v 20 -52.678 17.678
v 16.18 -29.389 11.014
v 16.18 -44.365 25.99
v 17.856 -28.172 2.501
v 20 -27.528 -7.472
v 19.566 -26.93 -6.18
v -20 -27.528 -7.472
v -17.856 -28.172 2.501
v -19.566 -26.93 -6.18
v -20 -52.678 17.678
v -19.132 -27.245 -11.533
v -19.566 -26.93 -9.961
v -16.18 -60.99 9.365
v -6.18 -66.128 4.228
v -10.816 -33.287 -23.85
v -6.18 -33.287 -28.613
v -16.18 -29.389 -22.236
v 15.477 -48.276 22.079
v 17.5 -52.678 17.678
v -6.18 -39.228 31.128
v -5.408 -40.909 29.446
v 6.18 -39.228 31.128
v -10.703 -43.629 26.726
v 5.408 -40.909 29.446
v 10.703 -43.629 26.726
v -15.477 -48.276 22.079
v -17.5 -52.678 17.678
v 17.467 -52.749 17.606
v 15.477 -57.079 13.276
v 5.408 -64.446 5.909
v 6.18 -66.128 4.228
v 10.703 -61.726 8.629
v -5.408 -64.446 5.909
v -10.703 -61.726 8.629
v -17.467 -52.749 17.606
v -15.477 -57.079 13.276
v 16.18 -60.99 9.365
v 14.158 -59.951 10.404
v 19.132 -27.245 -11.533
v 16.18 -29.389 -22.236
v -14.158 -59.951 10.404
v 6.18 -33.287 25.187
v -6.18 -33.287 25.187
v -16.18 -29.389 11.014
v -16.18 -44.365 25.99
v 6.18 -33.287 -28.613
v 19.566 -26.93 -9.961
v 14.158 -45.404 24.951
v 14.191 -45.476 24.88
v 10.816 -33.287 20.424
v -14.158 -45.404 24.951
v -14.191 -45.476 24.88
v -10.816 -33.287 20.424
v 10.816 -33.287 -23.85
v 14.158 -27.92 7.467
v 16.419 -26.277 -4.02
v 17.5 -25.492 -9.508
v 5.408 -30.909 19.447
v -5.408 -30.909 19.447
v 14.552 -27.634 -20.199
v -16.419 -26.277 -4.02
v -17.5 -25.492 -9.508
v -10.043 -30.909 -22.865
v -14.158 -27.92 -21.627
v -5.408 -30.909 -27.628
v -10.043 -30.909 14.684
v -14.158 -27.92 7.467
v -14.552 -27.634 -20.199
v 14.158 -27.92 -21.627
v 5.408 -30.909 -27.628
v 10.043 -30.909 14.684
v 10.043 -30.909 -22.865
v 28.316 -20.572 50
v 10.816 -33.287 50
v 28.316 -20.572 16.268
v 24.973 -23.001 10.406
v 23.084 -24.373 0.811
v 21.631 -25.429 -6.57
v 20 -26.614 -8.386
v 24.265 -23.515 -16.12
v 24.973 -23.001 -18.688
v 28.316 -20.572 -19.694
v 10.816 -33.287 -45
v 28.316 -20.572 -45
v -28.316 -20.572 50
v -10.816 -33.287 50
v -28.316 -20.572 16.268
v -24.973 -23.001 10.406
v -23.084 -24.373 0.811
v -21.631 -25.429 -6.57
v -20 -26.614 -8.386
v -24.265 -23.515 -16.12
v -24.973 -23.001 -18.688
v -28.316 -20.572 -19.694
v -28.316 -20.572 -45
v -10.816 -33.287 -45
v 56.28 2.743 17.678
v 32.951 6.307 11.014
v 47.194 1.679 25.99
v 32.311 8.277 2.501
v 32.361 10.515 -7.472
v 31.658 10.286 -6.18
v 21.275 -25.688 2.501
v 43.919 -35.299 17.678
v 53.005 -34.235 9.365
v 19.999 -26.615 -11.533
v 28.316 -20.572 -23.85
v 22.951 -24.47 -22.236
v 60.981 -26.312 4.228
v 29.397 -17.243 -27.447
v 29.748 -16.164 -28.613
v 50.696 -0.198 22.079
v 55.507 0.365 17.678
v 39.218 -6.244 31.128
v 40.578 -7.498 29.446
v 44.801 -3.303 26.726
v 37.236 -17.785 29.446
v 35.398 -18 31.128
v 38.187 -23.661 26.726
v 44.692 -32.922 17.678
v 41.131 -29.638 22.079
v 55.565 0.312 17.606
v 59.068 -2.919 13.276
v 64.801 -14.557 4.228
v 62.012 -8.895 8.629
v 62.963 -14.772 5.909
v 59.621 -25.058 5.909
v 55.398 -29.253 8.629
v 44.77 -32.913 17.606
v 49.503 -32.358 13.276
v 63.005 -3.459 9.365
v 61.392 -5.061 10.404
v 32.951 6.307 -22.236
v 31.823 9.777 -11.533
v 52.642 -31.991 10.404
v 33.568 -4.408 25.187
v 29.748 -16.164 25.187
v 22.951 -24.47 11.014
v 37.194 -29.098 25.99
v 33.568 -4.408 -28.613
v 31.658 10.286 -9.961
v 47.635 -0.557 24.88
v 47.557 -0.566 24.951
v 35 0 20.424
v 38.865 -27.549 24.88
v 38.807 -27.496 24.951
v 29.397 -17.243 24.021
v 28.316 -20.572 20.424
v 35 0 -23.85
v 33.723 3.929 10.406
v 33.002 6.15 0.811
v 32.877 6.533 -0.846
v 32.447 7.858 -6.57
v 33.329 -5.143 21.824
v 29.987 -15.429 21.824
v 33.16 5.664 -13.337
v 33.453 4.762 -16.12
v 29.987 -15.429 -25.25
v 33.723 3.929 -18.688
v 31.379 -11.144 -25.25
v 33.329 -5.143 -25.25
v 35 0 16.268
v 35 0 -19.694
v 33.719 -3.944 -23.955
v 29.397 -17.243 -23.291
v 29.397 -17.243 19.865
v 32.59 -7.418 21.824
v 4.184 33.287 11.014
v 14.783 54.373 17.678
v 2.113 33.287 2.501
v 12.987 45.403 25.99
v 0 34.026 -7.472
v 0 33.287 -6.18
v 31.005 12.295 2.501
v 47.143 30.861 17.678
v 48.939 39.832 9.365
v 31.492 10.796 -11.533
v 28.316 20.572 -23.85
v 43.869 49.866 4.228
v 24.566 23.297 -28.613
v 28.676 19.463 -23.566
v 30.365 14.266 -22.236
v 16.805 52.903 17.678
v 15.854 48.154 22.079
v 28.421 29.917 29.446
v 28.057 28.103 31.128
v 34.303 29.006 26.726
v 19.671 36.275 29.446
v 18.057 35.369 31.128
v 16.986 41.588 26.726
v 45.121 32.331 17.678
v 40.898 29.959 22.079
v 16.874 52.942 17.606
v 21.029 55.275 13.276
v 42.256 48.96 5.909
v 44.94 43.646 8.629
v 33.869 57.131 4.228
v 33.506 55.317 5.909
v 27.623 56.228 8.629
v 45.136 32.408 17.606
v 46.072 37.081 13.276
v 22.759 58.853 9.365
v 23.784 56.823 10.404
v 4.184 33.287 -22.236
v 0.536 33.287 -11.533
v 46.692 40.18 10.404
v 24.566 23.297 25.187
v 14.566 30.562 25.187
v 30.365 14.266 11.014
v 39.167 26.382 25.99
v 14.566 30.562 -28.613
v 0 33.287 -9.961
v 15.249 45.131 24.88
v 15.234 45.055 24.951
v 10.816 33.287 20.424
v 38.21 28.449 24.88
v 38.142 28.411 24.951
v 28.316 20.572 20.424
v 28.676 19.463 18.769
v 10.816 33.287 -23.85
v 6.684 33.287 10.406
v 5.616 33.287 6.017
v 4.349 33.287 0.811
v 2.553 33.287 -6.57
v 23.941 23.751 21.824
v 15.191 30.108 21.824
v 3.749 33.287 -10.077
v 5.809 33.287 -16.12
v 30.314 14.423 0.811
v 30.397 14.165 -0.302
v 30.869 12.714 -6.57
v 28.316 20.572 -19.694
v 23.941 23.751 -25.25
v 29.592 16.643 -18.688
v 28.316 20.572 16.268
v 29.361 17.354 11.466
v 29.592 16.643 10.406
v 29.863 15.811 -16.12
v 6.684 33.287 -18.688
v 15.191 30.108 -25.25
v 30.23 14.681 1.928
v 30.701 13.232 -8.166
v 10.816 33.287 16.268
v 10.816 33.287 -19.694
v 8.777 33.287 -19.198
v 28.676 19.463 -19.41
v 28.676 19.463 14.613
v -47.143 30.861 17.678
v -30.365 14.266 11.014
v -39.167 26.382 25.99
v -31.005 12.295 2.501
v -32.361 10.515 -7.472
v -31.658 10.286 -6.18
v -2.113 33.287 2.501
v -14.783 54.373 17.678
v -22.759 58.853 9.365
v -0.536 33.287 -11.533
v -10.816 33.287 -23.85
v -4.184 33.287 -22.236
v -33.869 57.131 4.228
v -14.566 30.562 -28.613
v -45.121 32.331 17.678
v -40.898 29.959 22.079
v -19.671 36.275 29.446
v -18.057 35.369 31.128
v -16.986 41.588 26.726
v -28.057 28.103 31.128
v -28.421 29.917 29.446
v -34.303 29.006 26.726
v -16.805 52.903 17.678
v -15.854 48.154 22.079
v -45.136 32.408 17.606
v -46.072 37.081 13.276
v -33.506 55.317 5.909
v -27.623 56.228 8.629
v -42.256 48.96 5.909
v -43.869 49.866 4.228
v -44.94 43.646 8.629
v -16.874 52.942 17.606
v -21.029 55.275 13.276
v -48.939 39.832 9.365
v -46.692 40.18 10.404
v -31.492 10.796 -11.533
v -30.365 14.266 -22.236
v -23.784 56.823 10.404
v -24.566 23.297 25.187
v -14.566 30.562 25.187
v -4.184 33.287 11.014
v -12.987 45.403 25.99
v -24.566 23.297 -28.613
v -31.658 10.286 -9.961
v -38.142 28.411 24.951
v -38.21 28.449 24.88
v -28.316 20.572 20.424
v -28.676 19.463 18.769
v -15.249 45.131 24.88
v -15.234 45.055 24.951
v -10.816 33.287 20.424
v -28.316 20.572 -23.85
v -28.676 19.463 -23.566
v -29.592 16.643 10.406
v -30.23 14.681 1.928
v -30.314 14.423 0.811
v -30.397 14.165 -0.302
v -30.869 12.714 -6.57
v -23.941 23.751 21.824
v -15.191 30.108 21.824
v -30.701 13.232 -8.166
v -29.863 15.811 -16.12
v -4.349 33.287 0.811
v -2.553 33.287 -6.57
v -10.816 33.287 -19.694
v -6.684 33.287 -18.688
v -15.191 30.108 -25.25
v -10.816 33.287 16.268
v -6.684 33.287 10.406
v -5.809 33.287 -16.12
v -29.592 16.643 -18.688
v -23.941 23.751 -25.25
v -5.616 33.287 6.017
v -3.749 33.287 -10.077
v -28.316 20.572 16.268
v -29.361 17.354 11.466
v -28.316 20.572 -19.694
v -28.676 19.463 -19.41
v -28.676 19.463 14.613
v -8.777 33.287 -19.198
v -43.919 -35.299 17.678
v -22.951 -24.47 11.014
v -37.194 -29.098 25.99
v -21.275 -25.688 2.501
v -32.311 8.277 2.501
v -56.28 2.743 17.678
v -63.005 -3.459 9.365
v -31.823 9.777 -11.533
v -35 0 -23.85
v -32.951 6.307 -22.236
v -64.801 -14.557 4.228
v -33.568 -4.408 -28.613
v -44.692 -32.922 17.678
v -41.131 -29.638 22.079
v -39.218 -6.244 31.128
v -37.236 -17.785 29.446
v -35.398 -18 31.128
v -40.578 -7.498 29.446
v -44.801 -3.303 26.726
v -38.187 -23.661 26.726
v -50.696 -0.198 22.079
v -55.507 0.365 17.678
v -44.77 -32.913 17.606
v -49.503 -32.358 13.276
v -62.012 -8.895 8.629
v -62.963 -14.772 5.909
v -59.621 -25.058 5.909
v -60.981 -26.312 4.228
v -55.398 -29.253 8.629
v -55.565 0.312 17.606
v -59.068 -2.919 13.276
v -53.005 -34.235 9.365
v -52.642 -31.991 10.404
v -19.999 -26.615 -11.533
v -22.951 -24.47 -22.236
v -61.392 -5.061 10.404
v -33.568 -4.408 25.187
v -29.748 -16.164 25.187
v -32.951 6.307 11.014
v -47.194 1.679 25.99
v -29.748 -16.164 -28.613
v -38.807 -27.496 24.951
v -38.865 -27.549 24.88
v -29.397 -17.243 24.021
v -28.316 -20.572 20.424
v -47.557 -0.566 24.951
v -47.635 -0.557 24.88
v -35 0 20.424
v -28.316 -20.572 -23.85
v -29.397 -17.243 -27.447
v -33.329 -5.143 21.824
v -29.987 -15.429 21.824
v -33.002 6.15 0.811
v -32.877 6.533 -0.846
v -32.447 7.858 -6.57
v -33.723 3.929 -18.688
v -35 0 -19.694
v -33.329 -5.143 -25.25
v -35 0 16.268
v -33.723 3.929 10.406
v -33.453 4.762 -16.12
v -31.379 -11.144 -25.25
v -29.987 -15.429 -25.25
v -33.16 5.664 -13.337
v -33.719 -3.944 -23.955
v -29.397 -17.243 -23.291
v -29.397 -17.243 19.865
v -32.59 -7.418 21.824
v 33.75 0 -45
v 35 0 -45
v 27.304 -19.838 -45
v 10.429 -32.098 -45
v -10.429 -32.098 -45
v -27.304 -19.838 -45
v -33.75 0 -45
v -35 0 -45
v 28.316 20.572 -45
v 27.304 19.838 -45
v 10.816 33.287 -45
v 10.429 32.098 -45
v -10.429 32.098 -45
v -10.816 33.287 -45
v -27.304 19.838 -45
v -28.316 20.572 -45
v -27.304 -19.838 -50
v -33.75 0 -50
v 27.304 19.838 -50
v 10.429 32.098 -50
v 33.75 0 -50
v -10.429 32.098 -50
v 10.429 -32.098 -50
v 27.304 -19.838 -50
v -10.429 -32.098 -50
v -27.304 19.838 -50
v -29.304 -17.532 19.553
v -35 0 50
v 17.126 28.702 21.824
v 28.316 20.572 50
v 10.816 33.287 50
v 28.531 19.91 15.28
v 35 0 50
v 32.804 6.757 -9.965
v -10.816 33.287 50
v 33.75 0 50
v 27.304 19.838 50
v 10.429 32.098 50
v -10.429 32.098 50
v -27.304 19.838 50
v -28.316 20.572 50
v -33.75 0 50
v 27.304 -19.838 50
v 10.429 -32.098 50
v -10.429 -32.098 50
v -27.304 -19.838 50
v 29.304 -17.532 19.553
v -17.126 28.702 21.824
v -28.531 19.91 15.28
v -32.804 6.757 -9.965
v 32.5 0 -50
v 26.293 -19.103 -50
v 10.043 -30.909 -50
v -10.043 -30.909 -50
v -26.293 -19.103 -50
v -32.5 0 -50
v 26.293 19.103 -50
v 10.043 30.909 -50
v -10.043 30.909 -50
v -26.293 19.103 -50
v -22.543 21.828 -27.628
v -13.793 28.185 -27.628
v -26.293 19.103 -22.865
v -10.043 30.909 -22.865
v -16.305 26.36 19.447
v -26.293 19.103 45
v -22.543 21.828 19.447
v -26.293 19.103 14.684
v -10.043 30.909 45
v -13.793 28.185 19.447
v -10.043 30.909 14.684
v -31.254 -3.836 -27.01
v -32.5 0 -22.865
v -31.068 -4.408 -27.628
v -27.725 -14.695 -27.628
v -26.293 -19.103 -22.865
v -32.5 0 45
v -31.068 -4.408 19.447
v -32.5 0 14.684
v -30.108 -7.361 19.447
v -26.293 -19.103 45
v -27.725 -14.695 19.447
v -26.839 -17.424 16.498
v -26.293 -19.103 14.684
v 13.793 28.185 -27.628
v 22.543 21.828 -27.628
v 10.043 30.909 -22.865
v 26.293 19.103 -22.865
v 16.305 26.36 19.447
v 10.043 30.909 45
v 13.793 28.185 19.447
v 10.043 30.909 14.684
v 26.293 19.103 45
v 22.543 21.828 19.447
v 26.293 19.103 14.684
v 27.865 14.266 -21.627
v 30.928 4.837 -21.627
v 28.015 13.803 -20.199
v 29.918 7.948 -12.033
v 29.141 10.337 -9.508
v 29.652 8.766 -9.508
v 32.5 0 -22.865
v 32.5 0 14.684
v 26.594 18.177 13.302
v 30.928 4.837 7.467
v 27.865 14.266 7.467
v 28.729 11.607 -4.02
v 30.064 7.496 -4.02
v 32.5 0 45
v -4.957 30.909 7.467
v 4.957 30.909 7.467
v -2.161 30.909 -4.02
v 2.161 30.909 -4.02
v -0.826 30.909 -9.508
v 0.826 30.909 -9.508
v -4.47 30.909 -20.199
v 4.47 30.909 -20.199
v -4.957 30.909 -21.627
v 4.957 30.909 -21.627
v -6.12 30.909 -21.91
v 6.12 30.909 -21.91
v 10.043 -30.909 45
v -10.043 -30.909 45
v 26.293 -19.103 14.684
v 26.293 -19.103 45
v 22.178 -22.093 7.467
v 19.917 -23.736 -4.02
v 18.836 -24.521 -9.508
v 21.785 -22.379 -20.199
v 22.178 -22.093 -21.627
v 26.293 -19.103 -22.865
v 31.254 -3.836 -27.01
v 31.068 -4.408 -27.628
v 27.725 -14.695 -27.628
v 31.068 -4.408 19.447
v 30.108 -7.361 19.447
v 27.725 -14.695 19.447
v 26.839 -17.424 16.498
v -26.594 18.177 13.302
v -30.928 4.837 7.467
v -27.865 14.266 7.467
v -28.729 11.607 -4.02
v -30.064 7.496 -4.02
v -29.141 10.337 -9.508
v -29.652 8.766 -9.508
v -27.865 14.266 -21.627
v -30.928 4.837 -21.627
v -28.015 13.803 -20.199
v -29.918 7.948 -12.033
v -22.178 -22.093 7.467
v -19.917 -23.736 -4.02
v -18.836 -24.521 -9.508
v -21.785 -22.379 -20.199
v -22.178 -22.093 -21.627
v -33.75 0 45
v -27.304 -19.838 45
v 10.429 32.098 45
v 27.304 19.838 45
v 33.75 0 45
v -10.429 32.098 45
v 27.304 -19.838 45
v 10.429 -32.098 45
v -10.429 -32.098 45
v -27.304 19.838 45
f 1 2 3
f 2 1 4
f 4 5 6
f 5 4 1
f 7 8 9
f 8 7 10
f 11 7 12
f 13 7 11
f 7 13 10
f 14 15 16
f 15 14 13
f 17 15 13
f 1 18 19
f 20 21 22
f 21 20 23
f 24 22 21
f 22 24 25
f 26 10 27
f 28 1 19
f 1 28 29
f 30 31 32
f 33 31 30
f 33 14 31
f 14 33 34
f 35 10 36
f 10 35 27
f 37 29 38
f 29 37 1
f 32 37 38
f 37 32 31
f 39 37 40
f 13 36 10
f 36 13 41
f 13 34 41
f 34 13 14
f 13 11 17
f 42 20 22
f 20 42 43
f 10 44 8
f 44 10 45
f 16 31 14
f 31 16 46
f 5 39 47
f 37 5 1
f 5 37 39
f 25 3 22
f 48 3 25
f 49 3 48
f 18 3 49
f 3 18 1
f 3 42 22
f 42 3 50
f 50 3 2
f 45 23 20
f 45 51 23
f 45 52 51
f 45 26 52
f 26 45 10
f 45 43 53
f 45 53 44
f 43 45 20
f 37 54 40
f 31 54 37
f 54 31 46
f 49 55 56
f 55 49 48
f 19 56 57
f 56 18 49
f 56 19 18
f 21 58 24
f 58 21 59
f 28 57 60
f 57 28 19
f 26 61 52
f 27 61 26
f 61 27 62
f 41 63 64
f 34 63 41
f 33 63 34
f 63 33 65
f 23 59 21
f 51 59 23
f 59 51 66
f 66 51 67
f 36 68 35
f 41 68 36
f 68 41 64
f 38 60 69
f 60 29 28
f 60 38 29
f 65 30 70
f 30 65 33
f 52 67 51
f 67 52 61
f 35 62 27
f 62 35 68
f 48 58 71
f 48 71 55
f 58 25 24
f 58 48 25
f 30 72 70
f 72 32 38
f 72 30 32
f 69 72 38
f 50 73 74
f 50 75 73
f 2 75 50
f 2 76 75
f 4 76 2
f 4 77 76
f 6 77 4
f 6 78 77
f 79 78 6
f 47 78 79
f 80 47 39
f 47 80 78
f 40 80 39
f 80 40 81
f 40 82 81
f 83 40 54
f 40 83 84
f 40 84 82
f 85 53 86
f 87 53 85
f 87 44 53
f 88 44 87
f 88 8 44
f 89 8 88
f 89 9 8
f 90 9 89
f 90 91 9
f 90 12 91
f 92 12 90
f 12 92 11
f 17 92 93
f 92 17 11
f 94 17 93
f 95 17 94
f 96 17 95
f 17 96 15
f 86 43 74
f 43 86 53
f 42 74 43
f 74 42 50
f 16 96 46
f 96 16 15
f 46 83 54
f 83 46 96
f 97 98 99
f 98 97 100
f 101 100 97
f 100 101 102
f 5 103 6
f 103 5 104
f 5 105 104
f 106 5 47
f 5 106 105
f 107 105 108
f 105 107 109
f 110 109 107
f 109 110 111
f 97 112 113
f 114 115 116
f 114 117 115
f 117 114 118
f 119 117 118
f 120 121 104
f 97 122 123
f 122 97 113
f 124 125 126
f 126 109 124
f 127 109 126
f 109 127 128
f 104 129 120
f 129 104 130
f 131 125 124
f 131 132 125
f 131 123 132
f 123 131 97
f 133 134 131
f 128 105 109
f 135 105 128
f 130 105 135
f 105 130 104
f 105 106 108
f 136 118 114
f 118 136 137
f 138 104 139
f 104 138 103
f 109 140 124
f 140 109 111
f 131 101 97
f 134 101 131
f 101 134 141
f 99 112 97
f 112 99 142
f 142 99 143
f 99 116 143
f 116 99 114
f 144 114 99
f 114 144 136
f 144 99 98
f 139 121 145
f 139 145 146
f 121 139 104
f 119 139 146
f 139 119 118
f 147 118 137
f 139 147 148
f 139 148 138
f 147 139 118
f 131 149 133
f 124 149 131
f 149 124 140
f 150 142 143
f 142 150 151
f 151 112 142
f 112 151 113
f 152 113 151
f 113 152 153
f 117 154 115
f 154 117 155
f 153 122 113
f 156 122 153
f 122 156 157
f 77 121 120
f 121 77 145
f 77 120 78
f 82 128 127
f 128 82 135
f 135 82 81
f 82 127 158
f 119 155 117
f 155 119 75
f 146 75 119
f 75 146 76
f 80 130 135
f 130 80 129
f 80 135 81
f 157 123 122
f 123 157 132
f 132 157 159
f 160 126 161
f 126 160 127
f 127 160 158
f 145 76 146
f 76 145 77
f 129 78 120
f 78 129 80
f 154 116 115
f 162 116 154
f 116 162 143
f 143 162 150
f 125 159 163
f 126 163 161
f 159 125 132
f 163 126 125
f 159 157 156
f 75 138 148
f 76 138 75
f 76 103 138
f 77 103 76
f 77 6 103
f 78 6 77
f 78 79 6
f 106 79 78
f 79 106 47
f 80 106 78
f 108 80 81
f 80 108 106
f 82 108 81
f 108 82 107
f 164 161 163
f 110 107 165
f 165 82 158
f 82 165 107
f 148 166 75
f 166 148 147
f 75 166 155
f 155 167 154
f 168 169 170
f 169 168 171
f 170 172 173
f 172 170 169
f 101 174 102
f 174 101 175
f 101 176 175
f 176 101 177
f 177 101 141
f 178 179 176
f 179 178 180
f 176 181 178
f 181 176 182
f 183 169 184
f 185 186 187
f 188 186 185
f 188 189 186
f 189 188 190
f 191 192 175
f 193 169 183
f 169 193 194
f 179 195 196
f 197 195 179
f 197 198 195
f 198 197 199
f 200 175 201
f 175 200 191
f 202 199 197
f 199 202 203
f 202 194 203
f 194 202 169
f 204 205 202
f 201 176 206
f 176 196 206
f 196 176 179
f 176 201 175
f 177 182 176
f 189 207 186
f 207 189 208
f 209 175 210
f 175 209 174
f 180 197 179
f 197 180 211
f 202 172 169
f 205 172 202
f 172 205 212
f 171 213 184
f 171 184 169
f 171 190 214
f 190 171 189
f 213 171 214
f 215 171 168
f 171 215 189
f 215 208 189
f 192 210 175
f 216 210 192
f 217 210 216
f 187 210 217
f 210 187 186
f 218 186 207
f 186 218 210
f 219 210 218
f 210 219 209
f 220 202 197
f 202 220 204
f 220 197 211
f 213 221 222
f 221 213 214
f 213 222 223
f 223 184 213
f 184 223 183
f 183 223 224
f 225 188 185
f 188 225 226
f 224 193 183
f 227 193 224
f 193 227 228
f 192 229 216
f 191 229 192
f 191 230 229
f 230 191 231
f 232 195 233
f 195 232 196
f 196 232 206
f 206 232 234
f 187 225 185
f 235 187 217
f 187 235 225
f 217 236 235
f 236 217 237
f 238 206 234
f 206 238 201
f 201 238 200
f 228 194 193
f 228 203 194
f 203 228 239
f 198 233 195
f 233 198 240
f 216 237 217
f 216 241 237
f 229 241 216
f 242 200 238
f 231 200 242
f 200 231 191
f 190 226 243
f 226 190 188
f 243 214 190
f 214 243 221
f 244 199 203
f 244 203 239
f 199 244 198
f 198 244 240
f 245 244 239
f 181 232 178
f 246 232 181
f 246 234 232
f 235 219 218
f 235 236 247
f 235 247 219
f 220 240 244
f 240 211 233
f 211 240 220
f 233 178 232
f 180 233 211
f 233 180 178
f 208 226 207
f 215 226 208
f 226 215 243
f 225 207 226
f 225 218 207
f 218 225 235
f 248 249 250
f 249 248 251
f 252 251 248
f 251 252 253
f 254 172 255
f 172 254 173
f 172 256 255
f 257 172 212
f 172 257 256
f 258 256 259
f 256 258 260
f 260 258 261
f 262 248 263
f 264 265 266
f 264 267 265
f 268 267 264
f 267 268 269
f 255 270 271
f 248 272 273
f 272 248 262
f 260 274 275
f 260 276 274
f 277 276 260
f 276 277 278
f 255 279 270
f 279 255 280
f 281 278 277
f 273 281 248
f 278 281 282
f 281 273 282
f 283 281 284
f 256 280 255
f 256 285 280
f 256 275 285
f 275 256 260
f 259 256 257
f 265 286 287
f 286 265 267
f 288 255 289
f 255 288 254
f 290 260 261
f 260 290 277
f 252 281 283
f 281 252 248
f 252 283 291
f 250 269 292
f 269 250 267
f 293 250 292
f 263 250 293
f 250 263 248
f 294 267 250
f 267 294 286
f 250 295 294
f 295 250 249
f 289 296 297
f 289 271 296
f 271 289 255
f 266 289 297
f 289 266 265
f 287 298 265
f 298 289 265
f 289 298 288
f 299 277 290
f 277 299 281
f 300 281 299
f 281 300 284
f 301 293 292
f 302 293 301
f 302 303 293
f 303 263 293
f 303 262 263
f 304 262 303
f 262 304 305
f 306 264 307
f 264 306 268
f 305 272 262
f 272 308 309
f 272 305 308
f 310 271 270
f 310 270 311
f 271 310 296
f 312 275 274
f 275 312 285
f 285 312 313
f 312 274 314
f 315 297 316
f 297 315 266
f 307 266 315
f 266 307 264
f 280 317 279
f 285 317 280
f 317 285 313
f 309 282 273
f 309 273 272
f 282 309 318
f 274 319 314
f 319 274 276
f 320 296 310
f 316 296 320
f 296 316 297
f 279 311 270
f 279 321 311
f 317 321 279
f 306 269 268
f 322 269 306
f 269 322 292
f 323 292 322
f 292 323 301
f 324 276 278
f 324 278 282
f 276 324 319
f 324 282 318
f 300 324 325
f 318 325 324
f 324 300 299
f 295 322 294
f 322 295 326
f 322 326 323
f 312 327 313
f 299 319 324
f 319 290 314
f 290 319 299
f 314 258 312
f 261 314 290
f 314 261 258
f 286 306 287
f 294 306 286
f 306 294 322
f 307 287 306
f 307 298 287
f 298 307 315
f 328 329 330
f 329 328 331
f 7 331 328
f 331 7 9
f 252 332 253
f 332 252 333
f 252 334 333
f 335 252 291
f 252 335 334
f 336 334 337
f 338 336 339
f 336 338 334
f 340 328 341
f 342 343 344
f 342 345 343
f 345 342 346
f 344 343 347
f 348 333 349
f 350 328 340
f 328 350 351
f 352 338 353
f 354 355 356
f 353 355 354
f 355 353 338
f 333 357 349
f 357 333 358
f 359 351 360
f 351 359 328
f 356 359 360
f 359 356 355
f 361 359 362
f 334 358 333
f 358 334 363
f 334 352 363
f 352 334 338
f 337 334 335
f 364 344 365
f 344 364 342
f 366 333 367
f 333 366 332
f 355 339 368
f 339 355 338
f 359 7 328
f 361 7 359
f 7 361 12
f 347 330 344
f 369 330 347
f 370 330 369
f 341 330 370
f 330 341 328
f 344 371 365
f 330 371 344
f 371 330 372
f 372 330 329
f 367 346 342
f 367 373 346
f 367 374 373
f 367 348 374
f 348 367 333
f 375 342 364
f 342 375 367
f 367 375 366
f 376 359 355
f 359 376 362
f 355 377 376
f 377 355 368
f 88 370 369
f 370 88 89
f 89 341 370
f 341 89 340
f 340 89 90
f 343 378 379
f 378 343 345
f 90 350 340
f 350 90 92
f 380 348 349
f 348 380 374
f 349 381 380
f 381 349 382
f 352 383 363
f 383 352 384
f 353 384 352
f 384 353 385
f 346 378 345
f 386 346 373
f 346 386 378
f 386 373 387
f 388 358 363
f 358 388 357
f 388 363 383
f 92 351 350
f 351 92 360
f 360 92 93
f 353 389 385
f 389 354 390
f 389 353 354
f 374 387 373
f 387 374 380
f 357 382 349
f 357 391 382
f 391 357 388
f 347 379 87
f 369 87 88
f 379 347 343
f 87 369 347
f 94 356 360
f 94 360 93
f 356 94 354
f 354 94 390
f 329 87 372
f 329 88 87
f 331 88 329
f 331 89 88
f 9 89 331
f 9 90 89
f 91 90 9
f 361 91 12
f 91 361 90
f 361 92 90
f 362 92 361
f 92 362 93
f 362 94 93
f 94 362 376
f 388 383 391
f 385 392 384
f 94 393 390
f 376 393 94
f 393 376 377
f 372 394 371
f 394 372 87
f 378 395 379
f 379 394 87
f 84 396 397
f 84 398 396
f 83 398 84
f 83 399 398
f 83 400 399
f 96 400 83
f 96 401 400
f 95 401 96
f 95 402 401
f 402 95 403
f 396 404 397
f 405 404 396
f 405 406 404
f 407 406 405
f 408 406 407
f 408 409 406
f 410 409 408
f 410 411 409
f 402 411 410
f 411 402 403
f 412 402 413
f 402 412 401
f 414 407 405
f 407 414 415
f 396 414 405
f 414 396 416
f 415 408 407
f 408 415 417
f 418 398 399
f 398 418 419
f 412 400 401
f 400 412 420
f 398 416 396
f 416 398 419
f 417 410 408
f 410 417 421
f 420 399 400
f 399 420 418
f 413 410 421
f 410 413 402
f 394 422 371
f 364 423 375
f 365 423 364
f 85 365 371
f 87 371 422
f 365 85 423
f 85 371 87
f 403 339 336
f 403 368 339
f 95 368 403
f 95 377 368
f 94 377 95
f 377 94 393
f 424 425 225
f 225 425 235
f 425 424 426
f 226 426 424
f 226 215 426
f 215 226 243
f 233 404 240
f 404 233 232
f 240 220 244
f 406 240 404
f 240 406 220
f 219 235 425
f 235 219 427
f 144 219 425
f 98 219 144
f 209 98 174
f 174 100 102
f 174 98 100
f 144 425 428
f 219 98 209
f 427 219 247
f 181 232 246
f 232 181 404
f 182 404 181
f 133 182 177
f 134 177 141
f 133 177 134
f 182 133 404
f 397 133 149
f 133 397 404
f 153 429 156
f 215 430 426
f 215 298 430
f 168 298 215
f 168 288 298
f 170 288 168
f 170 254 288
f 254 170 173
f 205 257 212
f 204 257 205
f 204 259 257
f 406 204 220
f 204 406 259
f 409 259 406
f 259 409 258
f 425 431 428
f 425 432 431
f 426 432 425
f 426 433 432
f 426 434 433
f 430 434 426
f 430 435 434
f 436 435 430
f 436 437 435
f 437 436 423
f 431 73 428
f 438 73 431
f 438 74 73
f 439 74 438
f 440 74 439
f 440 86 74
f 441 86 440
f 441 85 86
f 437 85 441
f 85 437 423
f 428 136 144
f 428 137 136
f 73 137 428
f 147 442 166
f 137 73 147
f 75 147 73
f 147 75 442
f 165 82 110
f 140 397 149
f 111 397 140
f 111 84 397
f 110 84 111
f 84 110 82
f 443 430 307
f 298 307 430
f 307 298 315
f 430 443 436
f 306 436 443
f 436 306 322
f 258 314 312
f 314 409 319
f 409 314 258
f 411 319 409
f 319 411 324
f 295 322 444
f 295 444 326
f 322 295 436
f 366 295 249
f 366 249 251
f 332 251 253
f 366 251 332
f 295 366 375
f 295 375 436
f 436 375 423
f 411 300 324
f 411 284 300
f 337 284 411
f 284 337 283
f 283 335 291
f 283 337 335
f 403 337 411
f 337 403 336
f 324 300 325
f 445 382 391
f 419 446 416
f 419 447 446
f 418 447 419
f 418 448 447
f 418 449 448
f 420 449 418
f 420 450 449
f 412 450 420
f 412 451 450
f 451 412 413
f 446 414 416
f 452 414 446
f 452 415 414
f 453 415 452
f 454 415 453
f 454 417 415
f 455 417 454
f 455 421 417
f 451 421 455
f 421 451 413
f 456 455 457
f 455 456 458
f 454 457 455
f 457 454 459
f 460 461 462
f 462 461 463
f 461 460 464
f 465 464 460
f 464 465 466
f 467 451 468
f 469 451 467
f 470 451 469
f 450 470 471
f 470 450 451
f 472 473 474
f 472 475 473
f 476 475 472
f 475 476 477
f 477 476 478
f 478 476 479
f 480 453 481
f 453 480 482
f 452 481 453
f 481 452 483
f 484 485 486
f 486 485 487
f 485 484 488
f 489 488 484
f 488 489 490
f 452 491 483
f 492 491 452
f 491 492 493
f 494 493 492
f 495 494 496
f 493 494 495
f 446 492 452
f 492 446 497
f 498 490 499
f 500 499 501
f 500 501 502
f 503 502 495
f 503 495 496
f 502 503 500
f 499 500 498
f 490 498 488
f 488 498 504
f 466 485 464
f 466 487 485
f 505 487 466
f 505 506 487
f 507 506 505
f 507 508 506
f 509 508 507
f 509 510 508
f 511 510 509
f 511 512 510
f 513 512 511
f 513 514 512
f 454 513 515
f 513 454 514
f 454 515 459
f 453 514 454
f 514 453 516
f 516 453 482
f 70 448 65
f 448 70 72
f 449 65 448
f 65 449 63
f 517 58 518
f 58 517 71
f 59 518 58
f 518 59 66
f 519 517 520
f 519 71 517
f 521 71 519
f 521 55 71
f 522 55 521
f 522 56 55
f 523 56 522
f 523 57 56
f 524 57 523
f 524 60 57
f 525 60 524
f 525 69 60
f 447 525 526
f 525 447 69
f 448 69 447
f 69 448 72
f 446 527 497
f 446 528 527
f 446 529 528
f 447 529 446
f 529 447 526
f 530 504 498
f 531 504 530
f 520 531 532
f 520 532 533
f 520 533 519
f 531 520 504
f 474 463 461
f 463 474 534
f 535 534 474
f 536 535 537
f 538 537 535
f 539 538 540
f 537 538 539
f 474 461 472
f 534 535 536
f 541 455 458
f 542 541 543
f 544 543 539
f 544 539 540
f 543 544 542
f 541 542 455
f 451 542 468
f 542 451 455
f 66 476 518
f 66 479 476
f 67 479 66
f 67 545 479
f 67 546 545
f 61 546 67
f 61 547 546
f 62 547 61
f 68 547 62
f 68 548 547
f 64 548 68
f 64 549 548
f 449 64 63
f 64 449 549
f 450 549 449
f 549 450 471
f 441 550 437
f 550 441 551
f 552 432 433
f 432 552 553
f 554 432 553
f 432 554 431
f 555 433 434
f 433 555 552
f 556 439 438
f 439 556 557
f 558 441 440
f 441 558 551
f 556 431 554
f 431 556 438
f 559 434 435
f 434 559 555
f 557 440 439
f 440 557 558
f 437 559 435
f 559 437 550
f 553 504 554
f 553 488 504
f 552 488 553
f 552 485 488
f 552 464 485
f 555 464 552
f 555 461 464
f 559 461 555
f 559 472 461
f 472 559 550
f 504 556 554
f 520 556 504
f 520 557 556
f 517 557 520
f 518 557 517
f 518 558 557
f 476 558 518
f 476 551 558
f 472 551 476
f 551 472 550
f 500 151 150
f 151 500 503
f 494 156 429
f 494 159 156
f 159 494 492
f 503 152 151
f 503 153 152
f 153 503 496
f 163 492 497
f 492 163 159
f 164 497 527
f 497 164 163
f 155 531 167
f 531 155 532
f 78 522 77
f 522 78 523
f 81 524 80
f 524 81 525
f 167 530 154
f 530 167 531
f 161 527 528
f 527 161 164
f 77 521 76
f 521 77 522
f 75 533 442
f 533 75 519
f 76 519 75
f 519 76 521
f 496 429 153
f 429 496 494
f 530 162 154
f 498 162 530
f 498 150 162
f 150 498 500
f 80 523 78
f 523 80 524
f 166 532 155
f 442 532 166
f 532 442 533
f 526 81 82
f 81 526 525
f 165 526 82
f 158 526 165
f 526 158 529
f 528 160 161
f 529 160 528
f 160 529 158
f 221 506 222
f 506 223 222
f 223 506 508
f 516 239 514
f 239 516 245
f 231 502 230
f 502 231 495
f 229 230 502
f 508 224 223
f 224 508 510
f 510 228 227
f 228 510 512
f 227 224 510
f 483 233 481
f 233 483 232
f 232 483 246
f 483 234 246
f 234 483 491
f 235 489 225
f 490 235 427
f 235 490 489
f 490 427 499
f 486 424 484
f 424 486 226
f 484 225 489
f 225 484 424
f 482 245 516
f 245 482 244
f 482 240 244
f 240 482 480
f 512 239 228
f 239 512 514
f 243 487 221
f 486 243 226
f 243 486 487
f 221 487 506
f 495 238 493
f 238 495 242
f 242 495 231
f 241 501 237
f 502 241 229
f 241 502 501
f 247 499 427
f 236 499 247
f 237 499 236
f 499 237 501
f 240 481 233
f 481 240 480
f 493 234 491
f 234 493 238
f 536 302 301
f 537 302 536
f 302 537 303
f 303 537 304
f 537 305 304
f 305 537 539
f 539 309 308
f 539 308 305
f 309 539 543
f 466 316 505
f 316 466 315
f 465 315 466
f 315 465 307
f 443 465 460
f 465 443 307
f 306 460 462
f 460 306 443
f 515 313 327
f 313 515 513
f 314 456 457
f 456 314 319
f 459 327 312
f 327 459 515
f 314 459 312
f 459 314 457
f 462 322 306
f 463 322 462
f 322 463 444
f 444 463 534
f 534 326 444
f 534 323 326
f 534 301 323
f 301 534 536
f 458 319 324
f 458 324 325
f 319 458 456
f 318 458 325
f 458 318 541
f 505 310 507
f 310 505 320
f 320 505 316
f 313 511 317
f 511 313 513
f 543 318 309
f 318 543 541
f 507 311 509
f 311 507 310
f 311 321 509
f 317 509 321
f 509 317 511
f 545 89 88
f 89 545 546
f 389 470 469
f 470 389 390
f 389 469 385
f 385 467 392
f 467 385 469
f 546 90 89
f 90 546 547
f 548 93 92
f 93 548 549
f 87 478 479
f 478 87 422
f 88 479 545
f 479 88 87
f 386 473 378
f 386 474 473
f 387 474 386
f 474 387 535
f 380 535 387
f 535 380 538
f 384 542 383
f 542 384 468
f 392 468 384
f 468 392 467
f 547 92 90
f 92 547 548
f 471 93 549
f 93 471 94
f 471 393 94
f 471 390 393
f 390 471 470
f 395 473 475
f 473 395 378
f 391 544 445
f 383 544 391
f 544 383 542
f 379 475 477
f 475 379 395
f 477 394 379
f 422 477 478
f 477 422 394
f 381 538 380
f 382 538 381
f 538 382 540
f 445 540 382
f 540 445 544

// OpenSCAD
// file: x-way.scad
/* [Render] */
$fa=1;
$fs=0.4;
$fn=10;
$show_helpers = false;

/* [General] */
$wall_thickness = 2.5;

/* [Main Body] */
$main_height = 100;
$main_radius = 35;
$joining_height = 10;
$joining_radius = $main_radius - $wall_thickness / 2;

/* [Tubes] */
$tube_height = $main_height / 2;
$tube_radius = $main_radius - 15;
$tube_hole_dimensions = 15;
$tube_hole_offset = 0;

// Parts
module main_body() {
    difference() {
        // Cylinder
        main_body_outer();
        main_body_inner();

        // Top joining
        translate([0, 0, $main_height/2]) cylinder(h = $joining_height, r = $joining_radius, center = true);

        // Bottom joining
        translate([0, 0, -$main_height/2])
        difference() {
            cylinder(h = $joining_height, r = $main_radius + 1, center = true);
            cylinder(h = $joining_height, r = $joining_radius, center = true);
        }
    }
}

module main_body_outer() {
    cylinder(h = $main_height, r = $main_radius, center = true);
}

module main_body_inner() {
    cylinder(h = $main_height + 1, r = $main_radius - $wall_thickness, center = true);
}

module tube_body(r, t) {
    difference() {
        difference() {
            tube_body_outer(r, t);
            tube_body_inner(r, t);
        }
        main_body_outer();
    }
}

module tube_body_outer(r, t) {
    translate(t) {
        rotate(r) {
            cylinder(h = $tube_height, r = $tube_radius, center = true);
        }
    }
}

module tube_body_inner(r, t) {
    translate(t) {
        rotate(r) {
            cylinder(h = $tube_height + 1, r = $tube_radius - $wall_thickness, center = true);
        }
    }
}

// Assembled modules

module xWay(count) {
    $max_angle = 180;
    $per_item = $max_angle / count;
    
    if(count > 0) {
        for (i = [0 : count - 1]) {
            rotate([0, 0, i * $per_item * 2]) tube_body([45, 0, 0], [0, -$main_radius, 0]);
        }
    }

    difference() {
        main_body();
        if(count > 0) {
            for (i = [0 : count - 1]) {
                rotate([0, 0, i * $per_item * 2]) tube_body_inner([45, 0, 0], [0, -$main_radius, 0]);
            }
        }
    }
}
// main file
use <x-way.scad>;

/*  Check settings ("customizer variables") in x-way.scad.
    The current config is pre-defined for a 150x150x150mm printing area.
    To tweak use one of the following:
    1. via OpenSCAD's Command-Line
        Use the `--D` flag to change variables.
        E.g. `--D $fn=100` to make the circles smooth.
    2. via OpenSCAD GUI
        Open this file and check the Customizer panel.
        In case the variables don't show up, proceed to the 3rd option.
    3. via an Editor (or OpenSCAD GUI)
        Open the file from above (`use <THIS FILE.scad>`) in either 
        an Editor or OpenSCAD GUI and change the variables in code
        or inside the Customizer. 
        Afterwards (re-)open this file in OpenSCAD and see the changes.

        Note: Editing the variables inside the code will affect ALL models
        depending on it. This can have advantages, but also disadvantages.
*/

// --- 

xWay(5);
